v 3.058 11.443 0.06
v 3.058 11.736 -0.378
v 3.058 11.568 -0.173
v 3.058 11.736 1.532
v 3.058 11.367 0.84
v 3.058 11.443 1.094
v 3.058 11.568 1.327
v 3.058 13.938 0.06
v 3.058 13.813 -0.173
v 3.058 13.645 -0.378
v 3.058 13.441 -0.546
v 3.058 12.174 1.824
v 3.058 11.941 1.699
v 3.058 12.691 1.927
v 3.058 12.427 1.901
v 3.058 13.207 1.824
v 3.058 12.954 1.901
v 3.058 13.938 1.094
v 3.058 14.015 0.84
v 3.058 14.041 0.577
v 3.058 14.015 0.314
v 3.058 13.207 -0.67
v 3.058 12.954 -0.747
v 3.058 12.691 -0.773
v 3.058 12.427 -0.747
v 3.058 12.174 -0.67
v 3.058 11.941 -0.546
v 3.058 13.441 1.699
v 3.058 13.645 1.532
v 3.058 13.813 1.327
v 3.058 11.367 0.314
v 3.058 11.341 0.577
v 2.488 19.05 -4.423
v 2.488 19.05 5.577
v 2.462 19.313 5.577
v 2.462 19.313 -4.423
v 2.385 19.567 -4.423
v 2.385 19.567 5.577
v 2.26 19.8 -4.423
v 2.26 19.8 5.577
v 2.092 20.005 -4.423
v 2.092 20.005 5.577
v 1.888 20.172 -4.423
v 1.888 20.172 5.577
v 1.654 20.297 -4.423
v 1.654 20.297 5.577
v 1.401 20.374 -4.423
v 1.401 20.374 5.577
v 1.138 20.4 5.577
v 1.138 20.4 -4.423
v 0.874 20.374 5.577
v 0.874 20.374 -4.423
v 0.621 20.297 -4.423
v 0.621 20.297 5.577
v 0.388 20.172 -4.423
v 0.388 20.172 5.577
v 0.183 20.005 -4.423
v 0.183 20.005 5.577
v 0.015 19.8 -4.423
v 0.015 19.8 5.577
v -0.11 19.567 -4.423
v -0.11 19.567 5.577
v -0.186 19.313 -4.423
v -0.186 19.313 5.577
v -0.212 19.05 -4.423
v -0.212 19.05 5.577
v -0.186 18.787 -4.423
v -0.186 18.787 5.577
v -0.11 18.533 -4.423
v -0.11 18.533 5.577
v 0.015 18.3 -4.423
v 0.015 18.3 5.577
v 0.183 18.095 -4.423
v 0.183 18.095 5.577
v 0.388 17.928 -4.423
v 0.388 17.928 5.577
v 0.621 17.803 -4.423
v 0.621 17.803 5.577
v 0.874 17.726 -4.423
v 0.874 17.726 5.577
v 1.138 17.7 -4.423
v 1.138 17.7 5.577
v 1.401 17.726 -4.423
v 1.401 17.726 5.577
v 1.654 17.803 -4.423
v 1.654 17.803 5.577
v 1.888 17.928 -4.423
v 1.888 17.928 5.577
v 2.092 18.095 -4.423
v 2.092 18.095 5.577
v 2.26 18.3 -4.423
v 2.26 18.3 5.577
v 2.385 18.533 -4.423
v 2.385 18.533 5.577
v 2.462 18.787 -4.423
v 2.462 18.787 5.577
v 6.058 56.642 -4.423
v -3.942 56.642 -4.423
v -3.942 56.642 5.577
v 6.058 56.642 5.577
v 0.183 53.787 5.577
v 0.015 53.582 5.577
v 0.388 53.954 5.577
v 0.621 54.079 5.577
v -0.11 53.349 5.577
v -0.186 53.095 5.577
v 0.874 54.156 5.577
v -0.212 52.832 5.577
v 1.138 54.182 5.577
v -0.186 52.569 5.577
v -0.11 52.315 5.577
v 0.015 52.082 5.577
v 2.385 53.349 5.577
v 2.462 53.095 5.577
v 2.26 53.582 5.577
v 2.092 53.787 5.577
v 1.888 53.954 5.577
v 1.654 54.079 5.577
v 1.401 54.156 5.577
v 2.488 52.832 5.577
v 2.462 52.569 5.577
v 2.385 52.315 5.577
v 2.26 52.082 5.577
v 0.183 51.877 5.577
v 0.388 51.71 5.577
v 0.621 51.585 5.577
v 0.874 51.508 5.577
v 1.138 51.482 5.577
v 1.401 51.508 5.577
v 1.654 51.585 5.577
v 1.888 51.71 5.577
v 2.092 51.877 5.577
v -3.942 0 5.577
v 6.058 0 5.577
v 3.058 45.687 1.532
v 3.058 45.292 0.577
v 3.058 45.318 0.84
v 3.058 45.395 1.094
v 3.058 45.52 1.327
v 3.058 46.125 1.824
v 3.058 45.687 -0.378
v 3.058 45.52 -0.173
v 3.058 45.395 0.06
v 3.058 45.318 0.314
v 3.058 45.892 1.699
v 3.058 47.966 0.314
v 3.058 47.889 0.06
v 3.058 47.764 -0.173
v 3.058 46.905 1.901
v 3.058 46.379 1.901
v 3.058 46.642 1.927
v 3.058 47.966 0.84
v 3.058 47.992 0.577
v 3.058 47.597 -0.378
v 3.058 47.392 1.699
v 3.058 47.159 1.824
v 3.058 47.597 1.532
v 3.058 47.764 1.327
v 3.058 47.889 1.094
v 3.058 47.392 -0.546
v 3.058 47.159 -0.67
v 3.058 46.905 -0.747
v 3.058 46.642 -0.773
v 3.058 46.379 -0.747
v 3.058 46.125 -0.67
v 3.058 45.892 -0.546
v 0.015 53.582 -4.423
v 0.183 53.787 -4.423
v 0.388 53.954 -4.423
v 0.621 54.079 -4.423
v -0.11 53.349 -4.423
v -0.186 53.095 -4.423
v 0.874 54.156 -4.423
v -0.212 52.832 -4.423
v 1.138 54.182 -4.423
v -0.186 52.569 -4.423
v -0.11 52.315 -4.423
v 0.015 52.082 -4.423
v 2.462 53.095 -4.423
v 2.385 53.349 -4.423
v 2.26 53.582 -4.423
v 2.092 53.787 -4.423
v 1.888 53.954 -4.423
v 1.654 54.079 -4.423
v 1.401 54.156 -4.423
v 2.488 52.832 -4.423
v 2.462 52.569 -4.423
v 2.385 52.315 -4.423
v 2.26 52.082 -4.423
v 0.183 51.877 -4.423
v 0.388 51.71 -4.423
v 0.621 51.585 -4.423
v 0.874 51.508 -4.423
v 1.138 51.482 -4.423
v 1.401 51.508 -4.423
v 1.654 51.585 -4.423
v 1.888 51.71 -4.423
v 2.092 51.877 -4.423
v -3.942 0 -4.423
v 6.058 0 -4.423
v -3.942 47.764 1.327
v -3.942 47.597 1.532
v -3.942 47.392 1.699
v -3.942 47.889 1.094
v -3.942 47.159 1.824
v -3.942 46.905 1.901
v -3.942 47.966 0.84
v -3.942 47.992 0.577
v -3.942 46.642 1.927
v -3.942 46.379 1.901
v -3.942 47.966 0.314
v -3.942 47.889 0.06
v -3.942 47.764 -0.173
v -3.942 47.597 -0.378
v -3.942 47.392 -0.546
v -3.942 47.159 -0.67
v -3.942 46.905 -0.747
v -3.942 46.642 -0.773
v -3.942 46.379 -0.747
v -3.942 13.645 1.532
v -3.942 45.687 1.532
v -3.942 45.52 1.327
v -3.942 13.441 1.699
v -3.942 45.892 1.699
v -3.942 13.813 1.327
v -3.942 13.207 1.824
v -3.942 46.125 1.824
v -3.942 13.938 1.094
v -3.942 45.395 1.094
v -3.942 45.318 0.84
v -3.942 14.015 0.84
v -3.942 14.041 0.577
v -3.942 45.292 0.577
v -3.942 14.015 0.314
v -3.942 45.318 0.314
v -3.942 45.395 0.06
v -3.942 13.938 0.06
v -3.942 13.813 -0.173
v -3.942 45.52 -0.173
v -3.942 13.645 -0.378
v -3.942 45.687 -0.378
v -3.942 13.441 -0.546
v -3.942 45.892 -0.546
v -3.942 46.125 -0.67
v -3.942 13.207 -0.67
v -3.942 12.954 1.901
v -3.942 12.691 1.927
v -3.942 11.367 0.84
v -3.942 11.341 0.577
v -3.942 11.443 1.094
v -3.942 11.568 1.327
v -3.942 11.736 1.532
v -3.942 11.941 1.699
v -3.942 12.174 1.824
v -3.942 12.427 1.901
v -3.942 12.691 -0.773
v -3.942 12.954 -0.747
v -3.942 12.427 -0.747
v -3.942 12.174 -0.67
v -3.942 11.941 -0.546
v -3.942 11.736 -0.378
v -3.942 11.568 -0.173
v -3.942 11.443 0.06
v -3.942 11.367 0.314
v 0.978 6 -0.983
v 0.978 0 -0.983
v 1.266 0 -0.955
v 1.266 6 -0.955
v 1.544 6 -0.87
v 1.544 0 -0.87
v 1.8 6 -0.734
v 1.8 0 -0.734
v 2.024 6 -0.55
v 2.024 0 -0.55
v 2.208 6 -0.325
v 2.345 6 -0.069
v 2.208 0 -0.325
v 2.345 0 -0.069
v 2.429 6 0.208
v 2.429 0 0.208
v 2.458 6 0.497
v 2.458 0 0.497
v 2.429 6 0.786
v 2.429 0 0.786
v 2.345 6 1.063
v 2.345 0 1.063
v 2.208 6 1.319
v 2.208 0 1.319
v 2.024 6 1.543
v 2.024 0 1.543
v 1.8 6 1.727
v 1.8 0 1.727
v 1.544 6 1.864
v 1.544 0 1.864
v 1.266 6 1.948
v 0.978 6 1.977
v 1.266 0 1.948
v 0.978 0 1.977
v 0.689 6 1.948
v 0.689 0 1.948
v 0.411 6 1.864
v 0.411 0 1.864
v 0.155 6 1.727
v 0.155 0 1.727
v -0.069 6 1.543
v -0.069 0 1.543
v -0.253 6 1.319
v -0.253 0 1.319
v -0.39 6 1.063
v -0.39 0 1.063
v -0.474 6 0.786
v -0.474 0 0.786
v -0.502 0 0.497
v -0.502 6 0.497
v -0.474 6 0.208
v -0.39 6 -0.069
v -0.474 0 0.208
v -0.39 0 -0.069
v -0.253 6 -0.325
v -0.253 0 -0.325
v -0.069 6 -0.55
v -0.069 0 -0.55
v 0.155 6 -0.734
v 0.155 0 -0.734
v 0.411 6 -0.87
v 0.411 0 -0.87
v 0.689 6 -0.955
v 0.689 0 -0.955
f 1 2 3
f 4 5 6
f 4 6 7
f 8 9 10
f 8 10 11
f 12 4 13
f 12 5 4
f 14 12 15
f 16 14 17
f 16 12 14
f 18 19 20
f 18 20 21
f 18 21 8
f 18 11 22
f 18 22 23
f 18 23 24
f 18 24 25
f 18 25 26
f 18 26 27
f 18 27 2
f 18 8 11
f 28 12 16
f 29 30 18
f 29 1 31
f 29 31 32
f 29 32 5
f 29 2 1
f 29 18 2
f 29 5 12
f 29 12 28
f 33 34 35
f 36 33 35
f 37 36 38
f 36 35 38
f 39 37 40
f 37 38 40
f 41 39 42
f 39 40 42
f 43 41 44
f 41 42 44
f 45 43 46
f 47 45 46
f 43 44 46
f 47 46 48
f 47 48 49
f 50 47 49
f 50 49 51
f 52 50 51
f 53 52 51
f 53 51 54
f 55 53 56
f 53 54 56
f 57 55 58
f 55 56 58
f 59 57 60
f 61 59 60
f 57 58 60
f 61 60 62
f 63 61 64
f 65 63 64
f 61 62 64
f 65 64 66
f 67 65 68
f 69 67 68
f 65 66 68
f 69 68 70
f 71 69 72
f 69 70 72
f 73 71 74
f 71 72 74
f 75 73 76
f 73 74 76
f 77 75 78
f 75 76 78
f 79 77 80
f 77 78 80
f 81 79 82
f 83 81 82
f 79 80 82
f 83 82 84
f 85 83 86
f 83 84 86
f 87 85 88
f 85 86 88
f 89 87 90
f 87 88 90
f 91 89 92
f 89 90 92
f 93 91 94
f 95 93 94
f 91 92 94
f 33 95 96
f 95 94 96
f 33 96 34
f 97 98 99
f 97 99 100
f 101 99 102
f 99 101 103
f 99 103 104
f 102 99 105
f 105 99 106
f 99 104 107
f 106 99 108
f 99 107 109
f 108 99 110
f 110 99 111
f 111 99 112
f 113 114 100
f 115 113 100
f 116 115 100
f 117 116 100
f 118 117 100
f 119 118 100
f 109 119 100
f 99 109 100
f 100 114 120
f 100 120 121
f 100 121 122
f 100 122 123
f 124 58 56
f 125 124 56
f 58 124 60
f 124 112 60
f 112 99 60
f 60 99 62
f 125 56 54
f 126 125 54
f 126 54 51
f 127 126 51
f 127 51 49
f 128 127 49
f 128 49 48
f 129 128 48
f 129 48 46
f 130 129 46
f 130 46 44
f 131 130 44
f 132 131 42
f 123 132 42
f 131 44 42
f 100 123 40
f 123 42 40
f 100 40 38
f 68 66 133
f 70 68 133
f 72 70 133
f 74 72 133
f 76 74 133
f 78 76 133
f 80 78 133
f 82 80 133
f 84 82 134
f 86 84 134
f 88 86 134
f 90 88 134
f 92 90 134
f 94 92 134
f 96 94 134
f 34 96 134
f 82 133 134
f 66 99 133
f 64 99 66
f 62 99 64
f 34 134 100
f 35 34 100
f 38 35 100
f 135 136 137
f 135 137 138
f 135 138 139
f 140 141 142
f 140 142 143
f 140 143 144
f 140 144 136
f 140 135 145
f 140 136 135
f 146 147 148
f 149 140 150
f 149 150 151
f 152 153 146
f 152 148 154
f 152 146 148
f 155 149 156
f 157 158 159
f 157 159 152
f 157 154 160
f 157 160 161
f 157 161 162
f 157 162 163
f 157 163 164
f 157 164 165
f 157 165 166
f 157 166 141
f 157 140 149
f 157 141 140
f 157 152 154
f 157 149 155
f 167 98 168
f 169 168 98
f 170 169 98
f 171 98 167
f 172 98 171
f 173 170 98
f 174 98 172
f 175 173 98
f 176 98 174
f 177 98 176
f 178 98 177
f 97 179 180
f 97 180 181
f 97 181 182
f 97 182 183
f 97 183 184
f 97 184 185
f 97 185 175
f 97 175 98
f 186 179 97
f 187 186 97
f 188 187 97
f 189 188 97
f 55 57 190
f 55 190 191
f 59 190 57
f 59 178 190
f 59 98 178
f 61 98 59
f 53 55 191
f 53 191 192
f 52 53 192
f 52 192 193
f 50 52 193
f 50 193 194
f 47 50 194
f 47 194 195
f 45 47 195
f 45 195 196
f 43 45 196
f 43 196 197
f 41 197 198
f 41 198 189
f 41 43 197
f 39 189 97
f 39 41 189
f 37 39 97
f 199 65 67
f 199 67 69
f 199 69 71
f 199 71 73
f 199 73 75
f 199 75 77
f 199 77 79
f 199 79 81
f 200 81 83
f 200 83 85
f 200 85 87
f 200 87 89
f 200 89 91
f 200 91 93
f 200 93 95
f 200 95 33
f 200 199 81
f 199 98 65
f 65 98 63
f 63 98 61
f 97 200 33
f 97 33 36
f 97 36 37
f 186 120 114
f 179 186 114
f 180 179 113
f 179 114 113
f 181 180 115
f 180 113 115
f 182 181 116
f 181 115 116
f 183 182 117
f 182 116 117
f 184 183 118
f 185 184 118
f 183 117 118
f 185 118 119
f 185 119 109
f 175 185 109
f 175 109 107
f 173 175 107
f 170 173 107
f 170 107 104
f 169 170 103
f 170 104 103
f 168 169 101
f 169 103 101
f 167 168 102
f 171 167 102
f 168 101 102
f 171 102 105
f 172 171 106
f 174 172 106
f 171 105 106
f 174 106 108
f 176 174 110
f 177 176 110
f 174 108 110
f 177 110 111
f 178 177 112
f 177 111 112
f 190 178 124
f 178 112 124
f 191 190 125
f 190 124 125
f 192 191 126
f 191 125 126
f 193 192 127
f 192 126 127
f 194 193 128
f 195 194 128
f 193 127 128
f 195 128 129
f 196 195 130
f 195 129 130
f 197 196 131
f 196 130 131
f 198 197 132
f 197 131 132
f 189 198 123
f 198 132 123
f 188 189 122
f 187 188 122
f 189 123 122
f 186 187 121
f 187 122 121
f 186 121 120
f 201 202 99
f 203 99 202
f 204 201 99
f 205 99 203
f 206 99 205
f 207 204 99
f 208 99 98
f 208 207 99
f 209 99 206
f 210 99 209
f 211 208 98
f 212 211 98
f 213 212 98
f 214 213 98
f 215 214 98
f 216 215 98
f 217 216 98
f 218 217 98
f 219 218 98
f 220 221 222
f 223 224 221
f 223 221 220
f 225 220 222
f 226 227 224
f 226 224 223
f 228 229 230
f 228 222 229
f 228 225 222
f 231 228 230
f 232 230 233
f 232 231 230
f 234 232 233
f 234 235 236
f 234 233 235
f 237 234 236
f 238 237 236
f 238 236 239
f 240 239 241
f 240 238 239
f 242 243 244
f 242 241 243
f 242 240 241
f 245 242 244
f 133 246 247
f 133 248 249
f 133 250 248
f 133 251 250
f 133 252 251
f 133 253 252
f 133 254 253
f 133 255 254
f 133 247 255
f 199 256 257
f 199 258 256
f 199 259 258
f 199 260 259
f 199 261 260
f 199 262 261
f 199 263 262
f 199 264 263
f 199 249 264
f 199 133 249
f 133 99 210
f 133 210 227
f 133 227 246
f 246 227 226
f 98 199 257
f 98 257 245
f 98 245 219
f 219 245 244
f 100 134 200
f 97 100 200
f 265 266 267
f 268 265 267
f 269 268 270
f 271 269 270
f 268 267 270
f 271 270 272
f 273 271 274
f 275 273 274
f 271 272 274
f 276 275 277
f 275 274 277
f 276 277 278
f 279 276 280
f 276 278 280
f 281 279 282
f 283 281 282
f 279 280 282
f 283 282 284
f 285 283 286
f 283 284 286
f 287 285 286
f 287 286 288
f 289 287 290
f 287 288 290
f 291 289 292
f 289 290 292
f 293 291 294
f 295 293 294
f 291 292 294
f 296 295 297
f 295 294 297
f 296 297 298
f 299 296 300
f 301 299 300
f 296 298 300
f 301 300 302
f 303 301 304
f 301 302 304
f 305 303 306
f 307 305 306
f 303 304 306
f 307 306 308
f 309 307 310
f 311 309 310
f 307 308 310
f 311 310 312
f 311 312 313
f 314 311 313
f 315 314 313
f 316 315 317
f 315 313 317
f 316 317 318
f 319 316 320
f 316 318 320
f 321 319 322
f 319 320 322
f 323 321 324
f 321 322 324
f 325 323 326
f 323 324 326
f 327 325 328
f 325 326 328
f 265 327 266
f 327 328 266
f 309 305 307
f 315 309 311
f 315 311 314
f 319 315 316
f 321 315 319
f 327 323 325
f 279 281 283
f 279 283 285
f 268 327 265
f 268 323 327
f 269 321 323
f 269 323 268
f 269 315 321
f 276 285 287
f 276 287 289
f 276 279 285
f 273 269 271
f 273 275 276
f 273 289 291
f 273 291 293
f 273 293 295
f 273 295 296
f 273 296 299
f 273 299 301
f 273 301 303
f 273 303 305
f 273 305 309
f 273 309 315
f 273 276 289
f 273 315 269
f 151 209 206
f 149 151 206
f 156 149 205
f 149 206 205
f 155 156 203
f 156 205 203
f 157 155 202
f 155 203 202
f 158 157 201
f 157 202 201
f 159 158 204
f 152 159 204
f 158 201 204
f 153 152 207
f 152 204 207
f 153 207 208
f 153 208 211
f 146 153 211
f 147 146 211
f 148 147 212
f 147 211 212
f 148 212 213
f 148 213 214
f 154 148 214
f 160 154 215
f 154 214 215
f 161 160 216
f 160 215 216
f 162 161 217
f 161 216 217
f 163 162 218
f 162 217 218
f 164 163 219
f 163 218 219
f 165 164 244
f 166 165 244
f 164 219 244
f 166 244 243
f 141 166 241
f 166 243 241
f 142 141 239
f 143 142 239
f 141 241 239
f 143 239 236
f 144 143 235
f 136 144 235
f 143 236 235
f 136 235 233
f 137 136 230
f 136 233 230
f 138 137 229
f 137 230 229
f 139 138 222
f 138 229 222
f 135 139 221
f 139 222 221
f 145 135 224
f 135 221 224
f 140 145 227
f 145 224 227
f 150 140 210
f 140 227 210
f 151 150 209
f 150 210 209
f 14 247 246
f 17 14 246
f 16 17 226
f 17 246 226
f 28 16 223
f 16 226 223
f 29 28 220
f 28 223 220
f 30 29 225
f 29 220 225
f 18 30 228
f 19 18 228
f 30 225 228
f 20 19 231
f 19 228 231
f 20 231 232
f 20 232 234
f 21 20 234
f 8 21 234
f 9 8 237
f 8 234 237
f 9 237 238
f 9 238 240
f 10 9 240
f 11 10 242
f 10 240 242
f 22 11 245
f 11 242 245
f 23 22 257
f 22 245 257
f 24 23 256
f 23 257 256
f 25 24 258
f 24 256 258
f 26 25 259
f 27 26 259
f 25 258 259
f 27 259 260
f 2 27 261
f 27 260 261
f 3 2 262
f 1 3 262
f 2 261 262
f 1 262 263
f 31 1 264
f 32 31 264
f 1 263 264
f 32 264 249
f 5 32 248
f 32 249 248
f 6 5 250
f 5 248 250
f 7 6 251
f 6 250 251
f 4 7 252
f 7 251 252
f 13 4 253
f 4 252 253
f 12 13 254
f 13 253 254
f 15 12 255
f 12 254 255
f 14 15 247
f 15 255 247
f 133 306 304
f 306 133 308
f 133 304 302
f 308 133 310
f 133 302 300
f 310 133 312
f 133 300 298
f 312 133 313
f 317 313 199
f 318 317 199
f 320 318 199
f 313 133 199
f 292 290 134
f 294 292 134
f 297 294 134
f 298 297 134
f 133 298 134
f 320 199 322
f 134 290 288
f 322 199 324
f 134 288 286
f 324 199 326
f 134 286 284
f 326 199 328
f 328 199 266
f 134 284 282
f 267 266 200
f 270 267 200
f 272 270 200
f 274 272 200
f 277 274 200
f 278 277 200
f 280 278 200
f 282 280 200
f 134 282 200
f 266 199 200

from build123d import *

# Parameters (mm, degrees)
SKETCH1_W           = 10
SKETCH1_H           = 10
BOSS_EXTRUDE1_DEPTH = 56.642
SKETCH3_R           = 1.35
CUT_EXTRUDE1_DEPTH  = 10
SKETCH4_R           = 1.35
CUT_EXTRUDE2_DEPTH  = 7
SKETCH8_R           = 1.48
CUT_EXTRUDE3_DEPTH  = 6


with BuildPart() as part:
    # Sketch1 → Boss-Extrude1 (new body)
    with BuildSketch(Plane(origin=(0, 0, 0), x_dir=(1, 0, 0), z_dir=(0, 1, 0))):
        with Locations((1.057692308, -0.576923077)):
            Rectangle(SKETCH1_W, SKETCH1_H)
    extrude(amount=BOSS_EXTRUDE1_DEPTH)

    # Sketch3 → Cut-Extrude1 (cut)
    with BuildSketch(Plane.XY.offset(5.576923077)):
        with Locations((1.137692308, 19.05)):
            Circle(SKETCH3_R)
        with Locations((1.137692308, 52.832)):
            Circle(SKETCH3_R)
    extrude(amount=-CUT_EXTRUDE1_DEPTH, mode=Mode.SUBTRACT)

    # Sketch4 → Cut-Extrude2 (cut)
    with BuildSketch(Plane.ZY.offset(3.942307692)):
        with Locations((0.576923077, 12.690710938)):
            Circle(SKETCH4_R)
        with Locations((0.576923077, 46.642)):
            Circle(SKETCH4_R)
    extrude(amount=-CUT_EXTRUDE2_DEPTH, mode=Mode.SUBTRACT)

    # Sketch8 → Cut-Extrude3 (cut)
    with BuildSketch(Plane(origin=(0, 0, 0), x_dir=(-1, 0, 0), z_dir=(0, -1, 0))):
        with Locations(Location((-0.977692308, -0.496923077, 0), (0, 0, 90))):
            Circle(SKETCH8_R)
    extrude(amount=-CUT_EXTRUDE3_DEPTH, mode=Mode.SUBTRACT)


solid = part.part
